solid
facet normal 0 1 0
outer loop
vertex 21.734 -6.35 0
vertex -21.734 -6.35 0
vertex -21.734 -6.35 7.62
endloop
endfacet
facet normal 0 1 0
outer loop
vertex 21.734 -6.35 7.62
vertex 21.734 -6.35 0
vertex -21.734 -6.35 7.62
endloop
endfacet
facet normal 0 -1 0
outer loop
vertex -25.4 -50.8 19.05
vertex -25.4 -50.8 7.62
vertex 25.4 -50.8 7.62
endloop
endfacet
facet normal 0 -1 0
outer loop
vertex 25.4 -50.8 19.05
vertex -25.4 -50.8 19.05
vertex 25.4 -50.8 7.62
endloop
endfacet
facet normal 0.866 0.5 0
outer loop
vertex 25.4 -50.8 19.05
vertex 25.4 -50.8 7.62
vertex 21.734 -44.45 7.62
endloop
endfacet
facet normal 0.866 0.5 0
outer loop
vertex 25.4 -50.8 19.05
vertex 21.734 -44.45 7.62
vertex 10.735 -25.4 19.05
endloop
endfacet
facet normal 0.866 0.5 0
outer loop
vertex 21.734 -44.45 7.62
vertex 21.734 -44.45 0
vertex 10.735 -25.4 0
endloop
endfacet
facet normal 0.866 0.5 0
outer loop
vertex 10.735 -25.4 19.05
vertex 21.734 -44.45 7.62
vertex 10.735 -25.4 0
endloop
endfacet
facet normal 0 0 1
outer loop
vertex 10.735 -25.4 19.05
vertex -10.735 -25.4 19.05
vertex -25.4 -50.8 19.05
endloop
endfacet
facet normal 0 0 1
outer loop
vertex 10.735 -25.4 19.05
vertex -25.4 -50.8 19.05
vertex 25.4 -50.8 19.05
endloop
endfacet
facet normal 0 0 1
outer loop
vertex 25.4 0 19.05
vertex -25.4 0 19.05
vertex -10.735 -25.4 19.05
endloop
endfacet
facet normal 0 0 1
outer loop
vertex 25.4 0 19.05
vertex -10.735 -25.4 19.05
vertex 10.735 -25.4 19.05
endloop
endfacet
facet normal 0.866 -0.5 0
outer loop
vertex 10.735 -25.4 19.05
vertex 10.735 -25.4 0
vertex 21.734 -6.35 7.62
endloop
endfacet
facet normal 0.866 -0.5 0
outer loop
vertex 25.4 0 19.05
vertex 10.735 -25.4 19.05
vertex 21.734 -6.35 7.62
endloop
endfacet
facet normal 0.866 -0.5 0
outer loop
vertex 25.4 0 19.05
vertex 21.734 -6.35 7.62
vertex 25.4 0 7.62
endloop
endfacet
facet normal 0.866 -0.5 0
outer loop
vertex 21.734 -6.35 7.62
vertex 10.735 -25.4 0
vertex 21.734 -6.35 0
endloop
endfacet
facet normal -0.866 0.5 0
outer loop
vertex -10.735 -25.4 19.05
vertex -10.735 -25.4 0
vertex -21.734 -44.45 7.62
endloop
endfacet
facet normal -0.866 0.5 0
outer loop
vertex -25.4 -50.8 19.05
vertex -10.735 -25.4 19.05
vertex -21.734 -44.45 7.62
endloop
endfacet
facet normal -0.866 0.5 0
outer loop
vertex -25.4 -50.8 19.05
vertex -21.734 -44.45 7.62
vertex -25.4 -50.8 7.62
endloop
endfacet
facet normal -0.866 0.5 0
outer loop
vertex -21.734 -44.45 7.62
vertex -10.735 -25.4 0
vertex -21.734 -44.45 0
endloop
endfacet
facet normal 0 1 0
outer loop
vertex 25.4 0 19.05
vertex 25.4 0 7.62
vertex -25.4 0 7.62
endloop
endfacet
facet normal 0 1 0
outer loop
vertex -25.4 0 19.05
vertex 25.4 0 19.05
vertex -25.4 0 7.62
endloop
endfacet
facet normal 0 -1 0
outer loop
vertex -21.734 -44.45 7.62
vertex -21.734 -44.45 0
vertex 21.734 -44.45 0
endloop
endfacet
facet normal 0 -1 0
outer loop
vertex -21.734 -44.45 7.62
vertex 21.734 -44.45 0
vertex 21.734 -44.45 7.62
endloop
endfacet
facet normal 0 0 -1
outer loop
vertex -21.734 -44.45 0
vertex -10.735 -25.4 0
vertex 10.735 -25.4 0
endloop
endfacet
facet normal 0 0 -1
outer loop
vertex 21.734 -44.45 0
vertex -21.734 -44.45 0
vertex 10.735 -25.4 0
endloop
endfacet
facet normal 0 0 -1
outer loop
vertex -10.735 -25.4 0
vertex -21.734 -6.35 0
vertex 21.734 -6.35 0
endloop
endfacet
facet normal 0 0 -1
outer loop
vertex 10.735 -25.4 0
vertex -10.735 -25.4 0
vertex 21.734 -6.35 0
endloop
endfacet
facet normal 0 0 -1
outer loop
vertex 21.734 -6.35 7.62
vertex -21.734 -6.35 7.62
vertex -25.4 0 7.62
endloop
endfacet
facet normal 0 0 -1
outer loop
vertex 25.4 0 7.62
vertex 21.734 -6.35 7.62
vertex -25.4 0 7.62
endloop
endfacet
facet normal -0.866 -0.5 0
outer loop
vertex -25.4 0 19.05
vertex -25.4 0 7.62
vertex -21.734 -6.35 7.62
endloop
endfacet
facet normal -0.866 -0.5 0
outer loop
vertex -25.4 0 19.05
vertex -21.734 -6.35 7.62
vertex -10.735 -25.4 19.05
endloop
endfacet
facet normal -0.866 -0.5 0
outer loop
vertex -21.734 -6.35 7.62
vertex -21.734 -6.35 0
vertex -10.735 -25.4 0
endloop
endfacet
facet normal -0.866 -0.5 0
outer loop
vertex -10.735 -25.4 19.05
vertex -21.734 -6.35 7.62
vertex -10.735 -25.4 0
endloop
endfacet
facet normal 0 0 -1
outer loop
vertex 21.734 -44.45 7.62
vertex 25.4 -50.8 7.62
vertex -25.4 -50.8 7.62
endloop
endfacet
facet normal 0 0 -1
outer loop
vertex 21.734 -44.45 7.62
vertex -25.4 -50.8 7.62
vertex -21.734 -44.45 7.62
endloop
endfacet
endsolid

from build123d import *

# Parameters (mm, degrees)
F1_DEPTH      = 19.05
F2_W          = 6.35
F2_H          = 7.62
F3_DEPTH      = 25.401
F3_DEPTH_BACK = 25.4


with BuildPart() as f1:
    # F0 (on Top) → F1 (new body)
    with BuildSketch(Plane.XY):
        Polygon((25.4, 0), (0, 0), (-25.4, 0), (-10.7353031626, -25.4), (-25.4, -50.8), (0, -50.8), (25.4, -50.8), (10.7353031626, -25.4), align=None)
    extrude(amount=F1_DEPTH)

    # F2 (on Right) → F3 (cut, two sides)
    with BuildSketch(Plane.YZ) as f3_sk:
        with Locations((-3.175, 3.81)):
            Rectangle(F2_W, F2_H)
        with Locations((-47.625, 3.81)):
            Rectangle(F2_W, F2_H)
    extrude(amount=-F3_DEPTH, mode=Mode.SUBTRACT)
    extrude(f3_sk.sketch, amount=F3_DEPTH_BACK, mode=Mode.SUBTRACT)


solid = f1.part
